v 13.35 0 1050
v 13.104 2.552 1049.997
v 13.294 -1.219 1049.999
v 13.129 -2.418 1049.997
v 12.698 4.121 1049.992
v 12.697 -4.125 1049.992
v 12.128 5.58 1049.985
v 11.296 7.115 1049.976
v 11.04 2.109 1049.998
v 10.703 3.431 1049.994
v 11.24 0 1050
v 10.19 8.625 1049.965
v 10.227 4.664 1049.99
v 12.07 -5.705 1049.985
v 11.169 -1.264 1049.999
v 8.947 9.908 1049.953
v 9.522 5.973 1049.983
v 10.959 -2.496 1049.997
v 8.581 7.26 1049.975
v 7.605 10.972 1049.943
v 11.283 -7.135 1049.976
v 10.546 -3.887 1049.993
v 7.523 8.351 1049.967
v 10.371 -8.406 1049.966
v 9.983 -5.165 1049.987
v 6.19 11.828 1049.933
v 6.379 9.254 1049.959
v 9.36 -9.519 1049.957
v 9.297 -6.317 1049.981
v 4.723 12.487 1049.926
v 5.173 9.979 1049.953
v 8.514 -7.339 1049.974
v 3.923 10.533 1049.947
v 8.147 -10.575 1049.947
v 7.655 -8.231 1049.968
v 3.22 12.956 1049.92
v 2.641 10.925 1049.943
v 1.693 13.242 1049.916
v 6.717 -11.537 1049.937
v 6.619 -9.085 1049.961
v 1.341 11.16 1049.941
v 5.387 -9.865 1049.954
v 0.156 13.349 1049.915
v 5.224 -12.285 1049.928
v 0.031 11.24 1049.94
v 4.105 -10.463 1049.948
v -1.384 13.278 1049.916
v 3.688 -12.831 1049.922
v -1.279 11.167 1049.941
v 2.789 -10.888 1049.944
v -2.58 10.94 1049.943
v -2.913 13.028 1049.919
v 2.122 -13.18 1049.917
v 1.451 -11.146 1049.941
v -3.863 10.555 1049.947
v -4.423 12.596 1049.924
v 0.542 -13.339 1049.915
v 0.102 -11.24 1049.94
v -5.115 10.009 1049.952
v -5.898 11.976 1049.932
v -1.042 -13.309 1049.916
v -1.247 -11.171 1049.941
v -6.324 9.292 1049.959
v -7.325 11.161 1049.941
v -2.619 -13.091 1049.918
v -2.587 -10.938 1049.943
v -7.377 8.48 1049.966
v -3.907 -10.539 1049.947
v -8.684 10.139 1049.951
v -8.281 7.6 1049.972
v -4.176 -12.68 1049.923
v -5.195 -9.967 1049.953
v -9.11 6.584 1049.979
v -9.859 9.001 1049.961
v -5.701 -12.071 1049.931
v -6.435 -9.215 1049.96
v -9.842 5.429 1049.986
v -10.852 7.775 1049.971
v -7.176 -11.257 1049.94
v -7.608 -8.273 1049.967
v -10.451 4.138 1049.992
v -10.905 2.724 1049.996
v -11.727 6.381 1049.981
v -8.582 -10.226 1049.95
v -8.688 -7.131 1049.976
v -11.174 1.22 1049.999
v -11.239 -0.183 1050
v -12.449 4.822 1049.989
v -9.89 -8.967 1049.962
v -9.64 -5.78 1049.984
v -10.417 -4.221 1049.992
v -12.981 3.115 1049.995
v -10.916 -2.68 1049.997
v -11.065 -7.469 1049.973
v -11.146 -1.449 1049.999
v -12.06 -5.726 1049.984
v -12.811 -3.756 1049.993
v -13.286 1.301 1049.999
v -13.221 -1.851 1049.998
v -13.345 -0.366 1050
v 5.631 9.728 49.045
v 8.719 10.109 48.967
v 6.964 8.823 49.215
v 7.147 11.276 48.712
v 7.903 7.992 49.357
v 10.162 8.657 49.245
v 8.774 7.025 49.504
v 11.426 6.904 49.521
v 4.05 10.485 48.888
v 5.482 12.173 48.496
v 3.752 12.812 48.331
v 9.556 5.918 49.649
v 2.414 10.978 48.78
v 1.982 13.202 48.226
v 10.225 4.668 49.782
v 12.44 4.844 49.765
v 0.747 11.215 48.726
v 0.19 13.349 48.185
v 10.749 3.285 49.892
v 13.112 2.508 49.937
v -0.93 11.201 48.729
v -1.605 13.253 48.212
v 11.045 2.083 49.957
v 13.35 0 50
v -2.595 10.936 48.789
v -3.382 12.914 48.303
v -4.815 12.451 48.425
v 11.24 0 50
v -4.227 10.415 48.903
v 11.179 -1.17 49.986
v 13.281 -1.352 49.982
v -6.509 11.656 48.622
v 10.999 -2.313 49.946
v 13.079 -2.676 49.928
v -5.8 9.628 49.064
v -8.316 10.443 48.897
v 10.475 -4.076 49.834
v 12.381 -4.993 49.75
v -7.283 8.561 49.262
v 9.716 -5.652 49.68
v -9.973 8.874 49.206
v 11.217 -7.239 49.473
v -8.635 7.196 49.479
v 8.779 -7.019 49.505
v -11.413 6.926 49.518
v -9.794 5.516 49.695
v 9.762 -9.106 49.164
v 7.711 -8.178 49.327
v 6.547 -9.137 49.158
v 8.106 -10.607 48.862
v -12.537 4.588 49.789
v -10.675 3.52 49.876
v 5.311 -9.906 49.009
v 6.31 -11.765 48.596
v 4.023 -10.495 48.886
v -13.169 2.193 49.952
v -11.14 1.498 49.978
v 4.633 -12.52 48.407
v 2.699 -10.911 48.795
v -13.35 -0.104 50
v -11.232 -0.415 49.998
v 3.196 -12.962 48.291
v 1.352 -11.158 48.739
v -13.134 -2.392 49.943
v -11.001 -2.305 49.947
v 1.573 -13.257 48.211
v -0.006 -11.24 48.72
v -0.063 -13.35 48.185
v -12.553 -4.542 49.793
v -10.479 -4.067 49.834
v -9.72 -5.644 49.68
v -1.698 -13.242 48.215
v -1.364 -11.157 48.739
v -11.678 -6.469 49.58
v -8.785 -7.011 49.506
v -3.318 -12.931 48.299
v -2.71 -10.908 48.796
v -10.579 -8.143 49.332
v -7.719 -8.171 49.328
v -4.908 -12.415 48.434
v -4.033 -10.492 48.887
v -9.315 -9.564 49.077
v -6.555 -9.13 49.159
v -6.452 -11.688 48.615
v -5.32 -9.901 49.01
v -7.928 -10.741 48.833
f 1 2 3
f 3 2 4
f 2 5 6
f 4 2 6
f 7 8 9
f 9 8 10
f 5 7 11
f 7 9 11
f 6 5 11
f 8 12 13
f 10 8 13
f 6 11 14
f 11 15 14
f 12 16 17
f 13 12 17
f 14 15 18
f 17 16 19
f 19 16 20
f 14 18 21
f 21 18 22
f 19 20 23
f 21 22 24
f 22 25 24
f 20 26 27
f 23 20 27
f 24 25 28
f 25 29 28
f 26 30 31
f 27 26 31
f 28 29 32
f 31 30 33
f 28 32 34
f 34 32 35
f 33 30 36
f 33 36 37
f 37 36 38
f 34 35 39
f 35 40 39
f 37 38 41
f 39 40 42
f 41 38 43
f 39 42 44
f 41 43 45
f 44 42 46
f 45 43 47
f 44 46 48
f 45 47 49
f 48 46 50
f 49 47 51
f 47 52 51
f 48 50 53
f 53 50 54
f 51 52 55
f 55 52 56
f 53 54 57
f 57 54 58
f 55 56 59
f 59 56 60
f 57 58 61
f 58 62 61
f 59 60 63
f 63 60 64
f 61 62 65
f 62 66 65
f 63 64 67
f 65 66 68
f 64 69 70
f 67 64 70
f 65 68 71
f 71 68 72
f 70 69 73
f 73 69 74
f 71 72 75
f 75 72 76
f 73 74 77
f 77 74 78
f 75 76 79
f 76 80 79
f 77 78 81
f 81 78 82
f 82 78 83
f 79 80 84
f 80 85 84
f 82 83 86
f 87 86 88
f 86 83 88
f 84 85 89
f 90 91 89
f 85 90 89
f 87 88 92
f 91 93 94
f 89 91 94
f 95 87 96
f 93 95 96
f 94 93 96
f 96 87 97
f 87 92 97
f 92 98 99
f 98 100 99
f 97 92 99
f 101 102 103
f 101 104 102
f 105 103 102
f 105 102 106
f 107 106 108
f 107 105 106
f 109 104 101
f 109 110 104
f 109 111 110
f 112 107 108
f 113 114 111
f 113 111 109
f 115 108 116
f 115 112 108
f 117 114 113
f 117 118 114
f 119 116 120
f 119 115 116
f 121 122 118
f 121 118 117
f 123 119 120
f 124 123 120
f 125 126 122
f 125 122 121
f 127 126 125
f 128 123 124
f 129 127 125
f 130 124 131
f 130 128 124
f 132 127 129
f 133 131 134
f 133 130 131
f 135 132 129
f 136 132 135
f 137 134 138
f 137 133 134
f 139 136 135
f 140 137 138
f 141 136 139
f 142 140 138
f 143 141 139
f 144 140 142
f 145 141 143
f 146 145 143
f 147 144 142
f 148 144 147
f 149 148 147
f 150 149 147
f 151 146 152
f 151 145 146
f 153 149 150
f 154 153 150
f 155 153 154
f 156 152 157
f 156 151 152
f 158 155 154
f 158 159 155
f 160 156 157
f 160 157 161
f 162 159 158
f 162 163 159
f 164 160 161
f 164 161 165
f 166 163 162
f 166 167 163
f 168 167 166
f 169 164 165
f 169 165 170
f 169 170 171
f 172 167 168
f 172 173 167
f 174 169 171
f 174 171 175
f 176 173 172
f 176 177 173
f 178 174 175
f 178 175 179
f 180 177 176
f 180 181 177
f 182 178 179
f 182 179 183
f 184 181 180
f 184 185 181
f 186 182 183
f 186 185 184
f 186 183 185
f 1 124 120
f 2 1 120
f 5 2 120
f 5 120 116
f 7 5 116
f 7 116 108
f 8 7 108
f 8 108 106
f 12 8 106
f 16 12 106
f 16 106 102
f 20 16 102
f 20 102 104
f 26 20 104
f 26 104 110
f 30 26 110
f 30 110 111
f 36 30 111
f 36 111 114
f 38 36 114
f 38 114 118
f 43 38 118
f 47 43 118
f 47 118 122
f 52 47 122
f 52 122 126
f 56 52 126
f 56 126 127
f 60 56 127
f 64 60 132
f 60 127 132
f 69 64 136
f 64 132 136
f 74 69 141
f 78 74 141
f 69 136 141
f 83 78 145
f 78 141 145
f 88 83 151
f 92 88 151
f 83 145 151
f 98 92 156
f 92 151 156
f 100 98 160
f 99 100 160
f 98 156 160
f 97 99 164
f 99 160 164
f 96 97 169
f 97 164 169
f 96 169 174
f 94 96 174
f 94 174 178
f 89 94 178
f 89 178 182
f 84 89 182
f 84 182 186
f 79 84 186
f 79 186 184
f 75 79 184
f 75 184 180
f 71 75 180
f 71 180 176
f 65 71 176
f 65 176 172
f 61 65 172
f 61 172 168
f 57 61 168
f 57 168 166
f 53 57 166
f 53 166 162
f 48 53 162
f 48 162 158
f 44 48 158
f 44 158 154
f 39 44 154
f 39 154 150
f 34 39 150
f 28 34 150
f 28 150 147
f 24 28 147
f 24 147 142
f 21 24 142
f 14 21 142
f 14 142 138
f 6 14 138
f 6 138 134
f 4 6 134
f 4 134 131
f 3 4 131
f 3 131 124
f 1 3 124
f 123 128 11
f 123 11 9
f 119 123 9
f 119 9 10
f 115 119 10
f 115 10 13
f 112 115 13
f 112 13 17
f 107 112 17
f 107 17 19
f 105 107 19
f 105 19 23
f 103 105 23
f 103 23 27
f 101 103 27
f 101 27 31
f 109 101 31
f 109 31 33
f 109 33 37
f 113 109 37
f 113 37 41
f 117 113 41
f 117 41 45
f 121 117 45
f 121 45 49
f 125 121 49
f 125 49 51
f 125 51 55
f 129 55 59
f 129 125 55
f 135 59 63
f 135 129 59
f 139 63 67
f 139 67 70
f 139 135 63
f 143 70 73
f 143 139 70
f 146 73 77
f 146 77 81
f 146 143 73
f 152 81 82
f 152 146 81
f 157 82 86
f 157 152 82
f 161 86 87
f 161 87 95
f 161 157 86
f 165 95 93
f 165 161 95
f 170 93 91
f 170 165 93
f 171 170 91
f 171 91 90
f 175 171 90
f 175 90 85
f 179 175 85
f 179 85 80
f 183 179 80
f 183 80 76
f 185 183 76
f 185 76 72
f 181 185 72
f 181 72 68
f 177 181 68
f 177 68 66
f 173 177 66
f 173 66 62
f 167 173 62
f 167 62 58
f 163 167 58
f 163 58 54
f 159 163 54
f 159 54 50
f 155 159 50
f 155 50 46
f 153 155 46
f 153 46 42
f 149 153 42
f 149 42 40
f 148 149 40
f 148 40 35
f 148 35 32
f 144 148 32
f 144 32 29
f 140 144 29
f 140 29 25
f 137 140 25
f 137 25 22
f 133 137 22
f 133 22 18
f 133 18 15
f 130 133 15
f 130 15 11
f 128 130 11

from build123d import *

# Parameters (mm, degrees)
SKETCH1_R               = 13.35
SKETCH1_R_2             = 11.24
BOSS_EXTRUDE1_DEPTH     = 1100
CUT_EXTRUDE1_DEPTH      = 1101.162008524
CUT_EXTRUDE1_DEPTH_BACK = 1101.162008524
SKETCH2_R               = 50
CUT_EXTRUDE2_DEPTH      = 1101.162008627
CUT_EXTRUDE2_DEPTH_BACK = 1101.162008627
SKETCH3_R               = 2231.362480005
SKETCH3_R_2             = 1050


with BuildPart() as part:
    # Sketch1 → Boss-Extrude1 (new body)
    with BuildSketch(Plane.XY):
        Circle(SKETCH1_R)
        Circle(SKETCH1_R_2, mode=Mode.SUBTRACT)
    extrude(amount=BOSS_EXTRUDE1_DEPTH)

    # Sketch2 → Cut-Extrude1 (cut, two sides: drawn at the far end of the back side and taken through both)
    with BuildSketch(Plane(origin=(0, 0, 0), x_dir=(0, 0, -1), z_dir=(1, 0, 0)).offset(-CUT_EXTRUDE1_DEPTH_BACK)):
        Circle(SKETCH2_R)
    extrude(amount=CUT_EXTRUDE1_DEPTH + CUT_EXTRUDE1_DEPTH_BACK, mode=Mode.SUBTRACT)

    # Sketch3 → Cut-Extrude2 (cut, two sides: drawn at the far end of the back side and taken through both)
    with BuildSketch(Plane(origin=(0, 0, 0), x_dir=(0, 0, -1), z_dir=(1, 0, 0)).offset(-CUT_EXTRUDE2_DEPTH_BACK)):
        Circle(SKETCH3_R)
        Circle(SKETCH3_R_2, mode=Mode.SUBTRACT)
    extrude(amount=CUT_EXTRUDE2_DEPTH + CUT_EXTRUDE2_DEPTH_BACK, mode=Mode.SUBTRACT)


solid = part.part
